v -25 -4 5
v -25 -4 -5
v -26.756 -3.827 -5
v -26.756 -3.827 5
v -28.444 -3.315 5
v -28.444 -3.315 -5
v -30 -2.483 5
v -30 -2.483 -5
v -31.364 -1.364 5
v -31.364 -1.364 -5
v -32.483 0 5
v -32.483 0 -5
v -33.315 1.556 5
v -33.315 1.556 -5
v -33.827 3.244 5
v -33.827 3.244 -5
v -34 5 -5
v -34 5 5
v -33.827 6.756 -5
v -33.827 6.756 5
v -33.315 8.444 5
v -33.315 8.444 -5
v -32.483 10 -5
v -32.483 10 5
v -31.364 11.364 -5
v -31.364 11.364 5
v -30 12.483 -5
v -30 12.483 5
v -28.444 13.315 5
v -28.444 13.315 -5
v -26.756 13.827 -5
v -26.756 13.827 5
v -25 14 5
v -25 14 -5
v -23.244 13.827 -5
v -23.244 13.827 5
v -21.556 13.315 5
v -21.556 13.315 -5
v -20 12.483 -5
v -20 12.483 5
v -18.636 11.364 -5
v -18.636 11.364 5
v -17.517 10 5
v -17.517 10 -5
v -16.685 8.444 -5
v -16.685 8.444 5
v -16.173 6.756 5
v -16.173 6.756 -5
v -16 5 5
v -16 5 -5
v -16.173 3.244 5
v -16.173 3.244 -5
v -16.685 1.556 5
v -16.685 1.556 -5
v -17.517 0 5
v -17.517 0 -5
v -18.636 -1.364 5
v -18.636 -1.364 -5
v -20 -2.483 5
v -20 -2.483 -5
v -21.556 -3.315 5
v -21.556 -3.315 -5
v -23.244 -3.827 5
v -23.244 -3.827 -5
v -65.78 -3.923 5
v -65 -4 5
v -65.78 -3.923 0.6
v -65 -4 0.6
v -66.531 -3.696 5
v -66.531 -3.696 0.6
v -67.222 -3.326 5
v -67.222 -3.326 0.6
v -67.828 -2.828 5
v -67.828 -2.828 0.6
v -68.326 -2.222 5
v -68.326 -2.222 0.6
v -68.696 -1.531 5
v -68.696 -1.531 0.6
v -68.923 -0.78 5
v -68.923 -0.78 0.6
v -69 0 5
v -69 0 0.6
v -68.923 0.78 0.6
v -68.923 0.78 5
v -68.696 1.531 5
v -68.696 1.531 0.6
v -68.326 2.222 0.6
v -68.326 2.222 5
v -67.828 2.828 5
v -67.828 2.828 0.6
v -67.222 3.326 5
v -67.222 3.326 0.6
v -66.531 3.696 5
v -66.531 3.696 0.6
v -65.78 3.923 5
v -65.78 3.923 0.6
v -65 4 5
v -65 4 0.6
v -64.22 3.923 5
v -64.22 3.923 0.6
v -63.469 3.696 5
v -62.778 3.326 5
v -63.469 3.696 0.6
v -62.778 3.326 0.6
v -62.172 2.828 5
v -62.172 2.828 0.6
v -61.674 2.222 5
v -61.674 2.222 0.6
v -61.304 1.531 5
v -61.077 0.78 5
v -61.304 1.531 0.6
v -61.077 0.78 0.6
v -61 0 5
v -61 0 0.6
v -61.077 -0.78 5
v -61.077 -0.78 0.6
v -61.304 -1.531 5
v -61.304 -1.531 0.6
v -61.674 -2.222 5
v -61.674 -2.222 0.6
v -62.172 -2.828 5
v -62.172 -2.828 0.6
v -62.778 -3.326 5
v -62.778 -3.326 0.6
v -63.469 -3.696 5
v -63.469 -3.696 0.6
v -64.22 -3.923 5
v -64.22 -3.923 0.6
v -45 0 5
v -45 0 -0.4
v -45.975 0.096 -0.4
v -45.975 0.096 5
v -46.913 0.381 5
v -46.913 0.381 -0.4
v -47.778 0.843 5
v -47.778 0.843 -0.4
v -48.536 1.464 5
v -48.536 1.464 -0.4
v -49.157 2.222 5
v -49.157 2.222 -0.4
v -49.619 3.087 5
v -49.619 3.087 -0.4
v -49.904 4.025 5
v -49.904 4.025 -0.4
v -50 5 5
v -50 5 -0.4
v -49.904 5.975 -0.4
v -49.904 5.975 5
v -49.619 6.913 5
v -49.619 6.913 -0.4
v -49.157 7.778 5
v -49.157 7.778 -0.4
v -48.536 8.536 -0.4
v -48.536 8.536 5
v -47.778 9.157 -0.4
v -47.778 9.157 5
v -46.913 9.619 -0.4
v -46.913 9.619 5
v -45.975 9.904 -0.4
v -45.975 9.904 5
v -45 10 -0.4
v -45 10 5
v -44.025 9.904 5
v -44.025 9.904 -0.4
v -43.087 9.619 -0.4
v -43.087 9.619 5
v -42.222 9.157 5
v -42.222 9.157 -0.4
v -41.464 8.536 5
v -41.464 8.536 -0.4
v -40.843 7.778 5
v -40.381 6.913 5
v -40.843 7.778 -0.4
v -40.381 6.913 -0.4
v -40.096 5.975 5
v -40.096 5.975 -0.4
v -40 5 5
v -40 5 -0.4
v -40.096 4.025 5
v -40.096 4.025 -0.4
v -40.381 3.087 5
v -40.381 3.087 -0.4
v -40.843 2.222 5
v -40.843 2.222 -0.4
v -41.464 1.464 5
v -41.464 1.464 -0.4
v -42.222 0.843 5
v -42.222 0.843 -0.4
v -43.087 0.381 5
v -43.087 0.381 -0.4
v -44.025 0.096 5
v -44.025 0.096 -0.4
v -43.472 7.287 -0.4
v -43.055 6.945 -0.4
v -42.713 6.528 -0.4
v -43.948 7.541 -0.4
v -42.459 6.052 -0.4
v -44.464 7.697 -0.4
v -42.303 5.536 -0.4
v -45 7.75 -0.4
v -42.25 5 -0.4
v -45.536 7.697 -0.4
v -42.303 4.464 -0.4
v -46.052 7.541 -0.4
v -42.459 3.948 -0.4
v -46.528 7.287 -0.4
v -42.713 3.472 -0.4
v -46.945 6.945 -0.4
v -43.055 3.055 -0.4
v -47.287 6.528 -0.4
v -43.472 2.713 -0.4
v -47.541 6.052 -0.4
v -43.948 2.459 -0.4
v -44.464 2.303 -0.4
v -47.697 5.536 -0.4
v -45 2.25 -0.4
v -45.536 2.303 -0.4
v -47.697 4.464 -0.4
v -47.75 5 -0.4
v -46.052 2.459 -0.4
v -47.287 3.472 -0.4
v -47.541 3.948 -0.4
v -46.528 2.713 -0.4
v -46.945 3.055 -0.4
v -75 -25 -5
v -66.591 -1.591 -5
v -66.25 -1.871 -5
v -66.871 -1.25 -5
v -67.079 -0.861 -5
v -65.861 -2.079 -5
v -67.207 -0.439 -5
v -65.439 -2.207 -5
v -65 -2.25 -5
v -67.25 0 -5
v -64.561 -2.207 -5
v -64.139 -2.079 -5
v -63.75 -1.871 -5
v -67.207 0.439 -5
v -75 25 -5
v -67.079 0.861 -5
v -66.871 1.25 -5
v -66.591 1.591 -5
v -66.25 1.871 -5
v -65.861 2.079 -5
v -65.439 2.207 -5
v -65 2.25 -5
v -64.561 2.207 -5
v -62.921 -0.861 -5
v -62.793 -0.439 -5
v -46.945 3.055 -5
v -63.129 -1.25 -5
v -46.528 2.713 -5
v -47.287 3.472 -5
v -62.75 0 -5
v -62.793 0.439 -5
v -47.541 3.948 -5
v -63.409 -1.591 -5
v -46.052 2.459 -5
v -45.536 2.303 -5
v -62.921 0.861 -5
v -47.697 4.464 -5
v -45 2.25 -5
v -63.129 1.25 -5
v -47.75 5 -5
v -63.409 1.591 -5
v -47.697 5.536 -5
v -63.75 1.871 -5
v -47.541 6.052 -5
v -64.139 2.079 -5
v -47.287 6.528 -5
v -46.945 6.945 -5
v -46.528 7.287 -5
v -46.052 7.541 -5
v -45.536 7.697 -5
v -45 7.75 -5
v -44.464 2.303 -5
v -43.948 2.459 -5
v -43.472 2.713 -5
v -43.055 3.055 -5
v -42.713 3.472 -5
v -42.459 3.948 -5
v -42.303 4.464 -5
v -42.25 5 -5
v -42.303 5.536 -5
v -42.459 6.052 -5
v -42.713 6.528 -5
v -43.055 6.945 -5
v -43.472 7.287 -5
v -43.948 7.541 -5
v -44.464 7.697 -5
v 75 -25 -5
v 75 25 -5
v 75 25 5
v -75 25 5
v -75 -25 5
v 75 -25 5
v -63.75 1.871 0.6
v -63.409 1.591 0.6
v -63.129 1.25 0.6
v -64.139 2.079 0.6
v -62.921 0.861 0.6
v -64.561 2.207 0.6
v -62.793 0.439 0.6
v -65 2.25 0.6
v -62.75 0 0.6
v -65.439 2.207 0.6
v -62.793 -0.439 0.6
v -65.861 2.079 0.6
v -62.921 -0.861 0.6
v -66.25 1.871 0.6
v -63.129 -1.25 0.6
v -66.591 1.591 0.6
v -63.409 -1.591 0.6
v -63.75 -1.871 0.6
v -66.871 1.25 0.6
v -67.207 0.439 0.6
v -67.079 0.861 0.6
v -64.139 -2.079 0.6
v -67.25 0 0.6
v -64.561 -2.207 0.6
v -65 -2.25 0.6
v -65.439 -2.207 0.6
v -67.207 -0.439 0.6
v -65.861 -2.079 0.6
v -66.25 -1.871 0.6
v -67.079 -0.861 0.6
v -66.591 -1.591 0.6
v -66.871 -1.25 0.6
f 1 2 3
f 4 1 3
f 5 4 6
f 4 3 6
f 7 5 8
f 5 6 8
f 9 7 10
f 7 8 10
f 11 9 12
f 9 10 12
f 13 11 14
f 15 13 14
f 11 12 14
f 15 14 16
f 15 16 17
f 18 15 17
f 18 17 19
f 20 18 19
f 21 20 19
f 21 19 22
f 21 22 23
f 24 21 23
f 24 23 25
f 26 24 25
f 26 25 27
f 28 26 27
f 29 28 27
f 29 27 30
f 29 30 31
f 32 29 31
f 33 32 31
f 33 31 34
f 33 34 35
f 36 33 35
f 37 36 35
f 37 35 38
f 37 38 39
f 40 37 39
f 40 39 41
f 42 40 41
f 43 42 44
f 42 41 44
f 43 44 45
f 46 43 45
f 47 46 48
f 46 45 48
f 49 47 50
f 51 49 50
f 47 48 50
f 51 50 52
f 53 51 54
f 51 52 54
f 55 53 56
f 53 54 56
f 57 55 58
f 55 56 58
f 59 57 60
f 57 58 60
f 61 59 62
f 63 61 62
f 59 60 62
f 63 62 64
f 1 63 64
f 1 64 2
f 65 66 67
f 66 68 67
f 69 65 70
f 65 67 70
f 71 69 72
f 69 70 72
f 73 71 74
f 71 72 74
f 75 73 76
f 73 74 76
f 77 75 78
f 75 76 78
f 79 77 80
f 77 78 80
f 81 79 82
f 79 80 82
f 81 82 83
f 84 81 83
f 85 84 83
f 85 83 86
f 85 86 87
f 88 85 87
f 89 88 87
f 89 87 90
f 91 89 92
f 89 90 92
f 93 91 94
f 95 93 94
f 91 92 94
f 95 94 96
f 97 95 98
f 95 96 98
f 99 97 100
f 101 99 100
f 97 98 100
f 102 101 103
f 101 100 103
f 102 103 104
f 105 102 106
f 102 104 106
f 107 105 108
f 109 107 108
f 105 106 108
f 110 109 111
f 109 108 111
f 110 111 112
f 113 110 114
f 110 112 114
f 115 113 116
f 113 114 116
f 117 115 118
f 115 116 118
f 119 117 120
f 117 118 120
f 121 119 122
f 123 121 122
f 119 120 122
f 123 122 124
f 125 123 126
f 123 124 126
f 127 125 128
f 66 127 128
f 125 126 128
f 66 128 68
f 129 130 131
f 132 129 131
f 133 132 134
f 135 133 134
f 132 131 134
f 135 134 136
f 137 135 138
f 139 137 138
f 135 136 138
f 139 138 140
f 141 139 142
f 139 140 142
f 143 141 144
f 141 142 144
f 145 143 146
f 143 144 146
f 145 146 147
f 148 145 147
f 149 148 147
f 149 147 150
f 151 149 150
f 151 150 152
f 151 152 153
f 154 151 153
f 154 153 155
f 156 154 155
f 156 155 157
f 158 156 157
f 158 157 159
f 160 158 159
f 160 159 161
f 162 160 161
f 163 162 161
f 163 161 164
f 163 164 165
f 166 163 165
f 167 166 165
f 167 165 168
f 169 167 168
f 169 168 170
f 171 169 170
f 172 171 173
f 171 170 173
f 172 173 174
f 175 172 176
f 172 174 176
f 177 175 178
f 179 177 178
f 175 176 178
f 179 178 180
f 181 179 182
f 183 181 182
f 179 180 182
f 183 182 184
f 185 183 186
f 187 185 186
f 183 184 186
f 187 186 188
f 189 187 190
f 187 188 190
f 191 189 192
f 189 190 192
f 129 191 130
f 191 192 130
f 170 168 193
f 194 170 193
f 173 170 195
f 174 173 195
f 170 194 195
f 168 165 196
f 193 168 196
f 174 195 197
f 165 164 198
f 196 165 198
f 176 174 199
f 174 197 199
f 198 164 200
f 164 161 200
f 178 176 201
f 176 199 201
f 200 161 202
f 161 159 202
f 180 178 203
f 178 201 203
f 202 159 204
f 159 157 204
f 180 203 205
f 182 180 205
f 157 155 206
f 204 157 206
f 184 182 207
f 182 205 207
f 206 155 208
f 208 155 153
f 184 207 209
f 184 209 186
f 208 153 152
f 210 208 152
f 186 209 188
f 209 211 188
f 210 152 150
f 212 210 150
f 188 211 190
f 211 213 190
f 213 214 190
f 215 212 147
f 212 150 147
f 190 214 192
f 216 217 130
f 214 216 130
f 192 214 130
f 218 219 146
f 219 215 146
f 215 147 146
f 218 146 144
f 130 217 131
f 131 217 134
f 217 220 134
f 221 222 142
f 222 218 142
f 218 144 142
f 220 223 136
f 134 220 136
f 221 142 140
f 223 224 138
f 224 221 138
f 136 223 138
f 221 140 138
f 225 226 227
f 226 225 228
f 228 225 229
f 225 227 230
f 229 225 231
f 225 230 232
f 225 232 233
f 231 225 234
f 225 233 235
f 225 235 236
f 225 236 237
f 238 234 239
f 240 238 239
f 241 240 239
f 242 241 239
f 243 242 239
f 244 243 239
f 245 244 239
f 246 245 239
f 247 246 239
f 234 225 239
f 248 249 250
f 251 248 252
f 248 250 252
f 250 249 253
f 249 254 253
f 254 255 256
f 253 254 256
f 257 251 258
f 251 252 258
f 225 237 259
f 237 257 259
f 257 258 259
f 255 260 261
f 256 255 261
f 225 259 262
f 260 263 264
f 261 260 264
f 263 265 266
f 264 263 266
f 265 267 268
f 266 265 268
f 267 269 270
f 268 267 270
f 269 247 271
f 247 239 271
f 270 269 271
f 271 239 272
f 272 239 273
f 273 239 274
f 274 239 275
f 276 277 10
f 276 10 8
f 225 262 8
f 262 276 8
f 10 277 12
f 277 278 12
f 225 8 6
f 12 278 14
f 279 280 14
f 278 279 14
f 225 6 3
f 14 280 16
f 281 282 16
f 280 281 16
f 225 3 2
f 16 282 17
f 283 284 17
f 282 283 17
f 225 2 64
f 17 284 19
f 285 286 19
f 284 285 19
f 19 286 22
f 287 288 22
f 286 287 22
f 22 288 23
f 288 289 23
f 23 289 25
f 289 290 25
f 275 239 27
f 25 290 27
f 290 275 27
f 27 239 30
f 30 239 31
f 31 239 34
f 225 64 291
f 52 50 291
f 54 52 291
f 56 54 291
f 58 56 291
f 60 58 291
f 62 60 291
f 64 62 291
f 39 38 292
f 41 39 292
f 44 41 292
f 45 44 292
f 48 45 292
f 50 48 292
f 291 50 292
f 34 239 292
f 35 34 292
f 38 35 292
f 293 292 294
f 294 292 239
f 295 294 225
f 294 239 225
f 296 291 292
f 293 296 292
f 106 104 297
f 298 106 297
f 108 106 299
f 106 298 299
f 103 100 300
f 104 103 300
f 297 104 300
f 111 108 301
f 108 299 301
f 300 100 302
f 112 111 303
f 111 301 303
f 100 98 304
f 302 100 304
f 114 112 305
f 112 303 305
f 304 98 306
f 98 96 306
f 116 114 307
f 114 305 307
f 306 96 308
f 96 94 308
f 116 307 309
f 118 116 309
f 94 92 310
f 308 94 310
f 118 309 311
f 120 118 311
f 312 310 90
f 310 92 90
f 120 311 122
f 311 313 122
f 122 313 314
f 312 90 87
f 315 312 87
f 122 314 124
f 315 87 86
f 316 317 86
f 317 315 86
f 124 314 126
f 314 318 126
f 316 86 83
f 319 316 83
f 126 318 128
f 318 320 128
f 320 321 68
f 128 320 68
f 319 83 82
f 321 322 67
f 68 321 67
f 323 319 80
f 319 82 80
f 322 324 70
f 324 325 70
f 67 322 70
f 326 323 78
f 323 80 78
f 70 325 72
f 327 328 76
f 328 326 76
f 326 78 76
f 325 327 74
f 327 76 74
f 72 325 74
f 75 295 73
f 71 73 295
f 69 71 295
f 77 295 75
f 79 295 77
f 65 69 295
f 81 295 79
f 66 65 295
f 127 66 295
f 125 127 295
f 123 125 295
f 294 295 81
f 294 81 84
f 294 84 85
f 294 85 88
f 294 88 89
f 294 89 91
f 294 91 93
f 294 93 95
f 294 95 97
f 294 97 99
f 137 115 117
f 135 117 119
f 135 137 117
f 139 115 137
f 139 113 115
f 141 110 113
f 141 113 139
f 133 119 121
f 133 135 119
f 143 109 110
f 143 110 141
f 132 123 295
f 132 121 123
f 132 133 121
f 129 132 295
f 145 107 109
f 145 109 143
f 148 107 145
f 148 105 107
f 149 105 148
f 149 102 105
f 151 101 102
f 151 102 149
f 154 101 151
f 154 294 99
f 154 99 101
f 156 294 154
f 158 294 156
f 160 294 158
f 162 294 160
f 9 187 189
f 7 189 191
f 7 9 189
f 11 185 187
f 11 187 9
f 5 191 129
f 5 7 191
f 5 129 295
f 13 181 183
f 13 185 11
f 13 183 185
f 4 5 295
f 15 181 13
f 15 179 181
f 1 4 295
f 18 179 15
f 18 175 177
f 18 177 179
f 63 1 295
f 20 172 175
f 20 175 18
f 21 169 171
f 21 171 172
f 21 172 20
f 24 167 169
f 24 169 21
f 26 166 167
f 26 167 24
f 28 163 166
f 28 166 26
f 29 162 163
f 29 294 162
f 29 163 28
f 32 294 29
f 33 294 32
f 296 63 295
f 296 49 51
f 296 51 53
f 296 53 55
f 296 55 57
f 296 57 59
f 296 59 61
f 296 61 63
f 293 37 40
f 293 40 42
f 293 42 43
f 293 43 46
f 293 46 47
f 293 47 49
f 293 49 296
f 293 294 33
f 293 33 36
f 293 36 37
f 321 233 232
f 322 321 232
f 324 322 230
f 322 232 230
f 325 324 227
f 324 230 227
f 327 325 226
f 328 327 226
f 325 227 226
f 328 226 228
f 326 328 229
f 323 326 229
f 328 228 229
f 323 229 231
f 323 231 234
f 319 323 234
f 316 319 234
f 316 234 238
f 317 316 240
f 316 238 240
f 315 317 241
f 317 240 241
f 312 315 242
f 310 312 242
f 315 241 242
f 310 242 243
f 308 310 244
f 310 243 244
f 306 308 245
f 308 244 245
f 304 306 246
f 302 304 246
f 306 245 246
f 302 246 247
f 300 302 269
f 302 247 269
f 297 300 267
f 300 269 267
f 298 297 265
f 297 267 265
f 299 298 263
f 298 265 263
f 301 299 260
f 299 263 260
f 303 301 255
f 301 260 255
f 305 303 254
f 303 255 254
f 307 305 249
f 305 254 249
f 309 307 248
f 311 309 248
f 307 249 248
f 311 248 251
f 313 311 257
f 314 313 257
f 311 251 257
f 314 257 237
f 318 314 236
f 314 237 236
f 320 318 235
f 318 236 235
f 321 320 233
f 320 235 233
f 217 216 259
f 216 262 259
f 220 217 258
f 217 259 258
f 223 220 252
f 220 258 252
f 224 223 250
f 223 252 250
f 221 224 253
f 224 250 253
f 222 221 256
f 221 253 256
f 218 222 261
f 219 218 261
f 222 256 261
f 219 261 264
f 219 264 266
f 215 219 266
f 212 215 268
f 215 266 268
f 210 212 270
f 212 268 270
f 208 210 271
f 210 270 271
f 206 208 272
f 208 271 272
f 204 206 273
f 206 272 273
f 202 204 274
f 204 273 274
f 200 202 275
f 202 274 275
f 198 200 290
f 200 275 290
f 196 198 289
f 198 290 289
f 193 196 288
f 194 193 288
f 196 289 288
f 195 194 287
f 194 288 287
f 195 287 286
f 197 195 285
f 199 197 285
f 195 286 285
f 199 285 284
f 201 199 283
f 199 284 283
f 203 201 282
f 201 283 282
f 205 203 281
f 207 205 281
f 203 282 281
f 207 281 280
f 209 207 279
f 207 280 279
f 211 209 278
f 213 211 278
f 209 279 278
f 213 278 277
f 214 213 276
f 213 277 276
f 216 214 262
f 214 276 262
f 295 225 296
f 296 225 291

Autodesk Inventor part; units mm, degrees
ref_plane "YZ Plane" through (0, 0, 0) normal (1, 0, 0) x (0, 1, 0)
ref_plane "XZ Plane" through (0, 0, 0) normal (0, 1, 0) x (-1, 0, 0)
ref_plane "XY Plane" through (0, 0, 0) normal (0, 0, 1) x (1, 0, 0)
sketch "Sketch2" plane through (0, 0, 0) normal (0, 0, 1) x (1, 0, 0)
  line L0 (-75, -25) -> (75, -25)
  line L1 (75, -25) -> (75, 25)
  line L2 (75, 25) -> (-75, 25)
  line L3 (-75, 25) -> (-75, -25)
  line L4 (-75, -25) -> (75, 25) construction
  line L5 (75, -25) -> (-75, 25) construction
  point P0 (0, 0)
  dimension "d1" = 150
  dimension "d2" = 50
extrude "Extrusion1" add sketch "Sketch2" along normal mid plane 10
sketch "Sketch3" plane through (0, 0, 5) normal (0, 0, 1) x (1, 0, 0)
  line L0 (-75, 25) -> (-75, -25) projected
  line L1 (75, 25) -> (-75, 25) projected
  point P0 (0, 0)
  point P1 (-65, 0)
  dimension "d40" = 10
  dimension "d43" = 25
hole "Hole1" at (-65, 0, 5) direction (0, 0, -1) diameter 4.5 depth 14.2 tip angle 118 counterbore diameter 8 counterbore depth 4.4 clearance for "Socket Head Cap Screw" size "M4" standard "TS Profile"
sketch "Sketch4" plane through (0, 0, 5) normal (0, 0, 1) x (1, 0, 0)
  line L0 (-75, 25) -> (-75, -25) projected
  line L1 (75, 25) -> (-75, 25) projected
  point P0 (0, 0)
  point P1 (-45, 5)
  dimension "d41" = 30
  dimension "d42" = 20
hole "Hole2" at (-45, 5, 5) direction (0, 0, -1) diameter 5.5 depth 14.2 tip angle 118 counterbore diameter 10 counterbore depth 5.4 clearance for "Socket Head Cap Screw" size "M5" standard "TS Profile"
sketch "Sketch5" plane through (0, 0, 5) normal (0, 0, 1) x (1, 0, 0)
  line L0 (-75, 25) -> (-75, -25) projected
  line L1 (75, 25) -> (-75, 25) projected
  point P0 (0, 0)
  point P1 (-25, 5)
  dimension "d44" = 50
  dimension "d45" = 20
hole "Hole3" at (-25, 5, 5) direction (0, 0, -1) diameter 11 depth 14.2 tip angle 118 counterbore diameter 18 counterbore depth 10.8 clearance for "Socket Head Cap Screw" size "M10" standard "TS Profile"
properties part number "홀간 거리 확인 파트-8" material "SS400"
